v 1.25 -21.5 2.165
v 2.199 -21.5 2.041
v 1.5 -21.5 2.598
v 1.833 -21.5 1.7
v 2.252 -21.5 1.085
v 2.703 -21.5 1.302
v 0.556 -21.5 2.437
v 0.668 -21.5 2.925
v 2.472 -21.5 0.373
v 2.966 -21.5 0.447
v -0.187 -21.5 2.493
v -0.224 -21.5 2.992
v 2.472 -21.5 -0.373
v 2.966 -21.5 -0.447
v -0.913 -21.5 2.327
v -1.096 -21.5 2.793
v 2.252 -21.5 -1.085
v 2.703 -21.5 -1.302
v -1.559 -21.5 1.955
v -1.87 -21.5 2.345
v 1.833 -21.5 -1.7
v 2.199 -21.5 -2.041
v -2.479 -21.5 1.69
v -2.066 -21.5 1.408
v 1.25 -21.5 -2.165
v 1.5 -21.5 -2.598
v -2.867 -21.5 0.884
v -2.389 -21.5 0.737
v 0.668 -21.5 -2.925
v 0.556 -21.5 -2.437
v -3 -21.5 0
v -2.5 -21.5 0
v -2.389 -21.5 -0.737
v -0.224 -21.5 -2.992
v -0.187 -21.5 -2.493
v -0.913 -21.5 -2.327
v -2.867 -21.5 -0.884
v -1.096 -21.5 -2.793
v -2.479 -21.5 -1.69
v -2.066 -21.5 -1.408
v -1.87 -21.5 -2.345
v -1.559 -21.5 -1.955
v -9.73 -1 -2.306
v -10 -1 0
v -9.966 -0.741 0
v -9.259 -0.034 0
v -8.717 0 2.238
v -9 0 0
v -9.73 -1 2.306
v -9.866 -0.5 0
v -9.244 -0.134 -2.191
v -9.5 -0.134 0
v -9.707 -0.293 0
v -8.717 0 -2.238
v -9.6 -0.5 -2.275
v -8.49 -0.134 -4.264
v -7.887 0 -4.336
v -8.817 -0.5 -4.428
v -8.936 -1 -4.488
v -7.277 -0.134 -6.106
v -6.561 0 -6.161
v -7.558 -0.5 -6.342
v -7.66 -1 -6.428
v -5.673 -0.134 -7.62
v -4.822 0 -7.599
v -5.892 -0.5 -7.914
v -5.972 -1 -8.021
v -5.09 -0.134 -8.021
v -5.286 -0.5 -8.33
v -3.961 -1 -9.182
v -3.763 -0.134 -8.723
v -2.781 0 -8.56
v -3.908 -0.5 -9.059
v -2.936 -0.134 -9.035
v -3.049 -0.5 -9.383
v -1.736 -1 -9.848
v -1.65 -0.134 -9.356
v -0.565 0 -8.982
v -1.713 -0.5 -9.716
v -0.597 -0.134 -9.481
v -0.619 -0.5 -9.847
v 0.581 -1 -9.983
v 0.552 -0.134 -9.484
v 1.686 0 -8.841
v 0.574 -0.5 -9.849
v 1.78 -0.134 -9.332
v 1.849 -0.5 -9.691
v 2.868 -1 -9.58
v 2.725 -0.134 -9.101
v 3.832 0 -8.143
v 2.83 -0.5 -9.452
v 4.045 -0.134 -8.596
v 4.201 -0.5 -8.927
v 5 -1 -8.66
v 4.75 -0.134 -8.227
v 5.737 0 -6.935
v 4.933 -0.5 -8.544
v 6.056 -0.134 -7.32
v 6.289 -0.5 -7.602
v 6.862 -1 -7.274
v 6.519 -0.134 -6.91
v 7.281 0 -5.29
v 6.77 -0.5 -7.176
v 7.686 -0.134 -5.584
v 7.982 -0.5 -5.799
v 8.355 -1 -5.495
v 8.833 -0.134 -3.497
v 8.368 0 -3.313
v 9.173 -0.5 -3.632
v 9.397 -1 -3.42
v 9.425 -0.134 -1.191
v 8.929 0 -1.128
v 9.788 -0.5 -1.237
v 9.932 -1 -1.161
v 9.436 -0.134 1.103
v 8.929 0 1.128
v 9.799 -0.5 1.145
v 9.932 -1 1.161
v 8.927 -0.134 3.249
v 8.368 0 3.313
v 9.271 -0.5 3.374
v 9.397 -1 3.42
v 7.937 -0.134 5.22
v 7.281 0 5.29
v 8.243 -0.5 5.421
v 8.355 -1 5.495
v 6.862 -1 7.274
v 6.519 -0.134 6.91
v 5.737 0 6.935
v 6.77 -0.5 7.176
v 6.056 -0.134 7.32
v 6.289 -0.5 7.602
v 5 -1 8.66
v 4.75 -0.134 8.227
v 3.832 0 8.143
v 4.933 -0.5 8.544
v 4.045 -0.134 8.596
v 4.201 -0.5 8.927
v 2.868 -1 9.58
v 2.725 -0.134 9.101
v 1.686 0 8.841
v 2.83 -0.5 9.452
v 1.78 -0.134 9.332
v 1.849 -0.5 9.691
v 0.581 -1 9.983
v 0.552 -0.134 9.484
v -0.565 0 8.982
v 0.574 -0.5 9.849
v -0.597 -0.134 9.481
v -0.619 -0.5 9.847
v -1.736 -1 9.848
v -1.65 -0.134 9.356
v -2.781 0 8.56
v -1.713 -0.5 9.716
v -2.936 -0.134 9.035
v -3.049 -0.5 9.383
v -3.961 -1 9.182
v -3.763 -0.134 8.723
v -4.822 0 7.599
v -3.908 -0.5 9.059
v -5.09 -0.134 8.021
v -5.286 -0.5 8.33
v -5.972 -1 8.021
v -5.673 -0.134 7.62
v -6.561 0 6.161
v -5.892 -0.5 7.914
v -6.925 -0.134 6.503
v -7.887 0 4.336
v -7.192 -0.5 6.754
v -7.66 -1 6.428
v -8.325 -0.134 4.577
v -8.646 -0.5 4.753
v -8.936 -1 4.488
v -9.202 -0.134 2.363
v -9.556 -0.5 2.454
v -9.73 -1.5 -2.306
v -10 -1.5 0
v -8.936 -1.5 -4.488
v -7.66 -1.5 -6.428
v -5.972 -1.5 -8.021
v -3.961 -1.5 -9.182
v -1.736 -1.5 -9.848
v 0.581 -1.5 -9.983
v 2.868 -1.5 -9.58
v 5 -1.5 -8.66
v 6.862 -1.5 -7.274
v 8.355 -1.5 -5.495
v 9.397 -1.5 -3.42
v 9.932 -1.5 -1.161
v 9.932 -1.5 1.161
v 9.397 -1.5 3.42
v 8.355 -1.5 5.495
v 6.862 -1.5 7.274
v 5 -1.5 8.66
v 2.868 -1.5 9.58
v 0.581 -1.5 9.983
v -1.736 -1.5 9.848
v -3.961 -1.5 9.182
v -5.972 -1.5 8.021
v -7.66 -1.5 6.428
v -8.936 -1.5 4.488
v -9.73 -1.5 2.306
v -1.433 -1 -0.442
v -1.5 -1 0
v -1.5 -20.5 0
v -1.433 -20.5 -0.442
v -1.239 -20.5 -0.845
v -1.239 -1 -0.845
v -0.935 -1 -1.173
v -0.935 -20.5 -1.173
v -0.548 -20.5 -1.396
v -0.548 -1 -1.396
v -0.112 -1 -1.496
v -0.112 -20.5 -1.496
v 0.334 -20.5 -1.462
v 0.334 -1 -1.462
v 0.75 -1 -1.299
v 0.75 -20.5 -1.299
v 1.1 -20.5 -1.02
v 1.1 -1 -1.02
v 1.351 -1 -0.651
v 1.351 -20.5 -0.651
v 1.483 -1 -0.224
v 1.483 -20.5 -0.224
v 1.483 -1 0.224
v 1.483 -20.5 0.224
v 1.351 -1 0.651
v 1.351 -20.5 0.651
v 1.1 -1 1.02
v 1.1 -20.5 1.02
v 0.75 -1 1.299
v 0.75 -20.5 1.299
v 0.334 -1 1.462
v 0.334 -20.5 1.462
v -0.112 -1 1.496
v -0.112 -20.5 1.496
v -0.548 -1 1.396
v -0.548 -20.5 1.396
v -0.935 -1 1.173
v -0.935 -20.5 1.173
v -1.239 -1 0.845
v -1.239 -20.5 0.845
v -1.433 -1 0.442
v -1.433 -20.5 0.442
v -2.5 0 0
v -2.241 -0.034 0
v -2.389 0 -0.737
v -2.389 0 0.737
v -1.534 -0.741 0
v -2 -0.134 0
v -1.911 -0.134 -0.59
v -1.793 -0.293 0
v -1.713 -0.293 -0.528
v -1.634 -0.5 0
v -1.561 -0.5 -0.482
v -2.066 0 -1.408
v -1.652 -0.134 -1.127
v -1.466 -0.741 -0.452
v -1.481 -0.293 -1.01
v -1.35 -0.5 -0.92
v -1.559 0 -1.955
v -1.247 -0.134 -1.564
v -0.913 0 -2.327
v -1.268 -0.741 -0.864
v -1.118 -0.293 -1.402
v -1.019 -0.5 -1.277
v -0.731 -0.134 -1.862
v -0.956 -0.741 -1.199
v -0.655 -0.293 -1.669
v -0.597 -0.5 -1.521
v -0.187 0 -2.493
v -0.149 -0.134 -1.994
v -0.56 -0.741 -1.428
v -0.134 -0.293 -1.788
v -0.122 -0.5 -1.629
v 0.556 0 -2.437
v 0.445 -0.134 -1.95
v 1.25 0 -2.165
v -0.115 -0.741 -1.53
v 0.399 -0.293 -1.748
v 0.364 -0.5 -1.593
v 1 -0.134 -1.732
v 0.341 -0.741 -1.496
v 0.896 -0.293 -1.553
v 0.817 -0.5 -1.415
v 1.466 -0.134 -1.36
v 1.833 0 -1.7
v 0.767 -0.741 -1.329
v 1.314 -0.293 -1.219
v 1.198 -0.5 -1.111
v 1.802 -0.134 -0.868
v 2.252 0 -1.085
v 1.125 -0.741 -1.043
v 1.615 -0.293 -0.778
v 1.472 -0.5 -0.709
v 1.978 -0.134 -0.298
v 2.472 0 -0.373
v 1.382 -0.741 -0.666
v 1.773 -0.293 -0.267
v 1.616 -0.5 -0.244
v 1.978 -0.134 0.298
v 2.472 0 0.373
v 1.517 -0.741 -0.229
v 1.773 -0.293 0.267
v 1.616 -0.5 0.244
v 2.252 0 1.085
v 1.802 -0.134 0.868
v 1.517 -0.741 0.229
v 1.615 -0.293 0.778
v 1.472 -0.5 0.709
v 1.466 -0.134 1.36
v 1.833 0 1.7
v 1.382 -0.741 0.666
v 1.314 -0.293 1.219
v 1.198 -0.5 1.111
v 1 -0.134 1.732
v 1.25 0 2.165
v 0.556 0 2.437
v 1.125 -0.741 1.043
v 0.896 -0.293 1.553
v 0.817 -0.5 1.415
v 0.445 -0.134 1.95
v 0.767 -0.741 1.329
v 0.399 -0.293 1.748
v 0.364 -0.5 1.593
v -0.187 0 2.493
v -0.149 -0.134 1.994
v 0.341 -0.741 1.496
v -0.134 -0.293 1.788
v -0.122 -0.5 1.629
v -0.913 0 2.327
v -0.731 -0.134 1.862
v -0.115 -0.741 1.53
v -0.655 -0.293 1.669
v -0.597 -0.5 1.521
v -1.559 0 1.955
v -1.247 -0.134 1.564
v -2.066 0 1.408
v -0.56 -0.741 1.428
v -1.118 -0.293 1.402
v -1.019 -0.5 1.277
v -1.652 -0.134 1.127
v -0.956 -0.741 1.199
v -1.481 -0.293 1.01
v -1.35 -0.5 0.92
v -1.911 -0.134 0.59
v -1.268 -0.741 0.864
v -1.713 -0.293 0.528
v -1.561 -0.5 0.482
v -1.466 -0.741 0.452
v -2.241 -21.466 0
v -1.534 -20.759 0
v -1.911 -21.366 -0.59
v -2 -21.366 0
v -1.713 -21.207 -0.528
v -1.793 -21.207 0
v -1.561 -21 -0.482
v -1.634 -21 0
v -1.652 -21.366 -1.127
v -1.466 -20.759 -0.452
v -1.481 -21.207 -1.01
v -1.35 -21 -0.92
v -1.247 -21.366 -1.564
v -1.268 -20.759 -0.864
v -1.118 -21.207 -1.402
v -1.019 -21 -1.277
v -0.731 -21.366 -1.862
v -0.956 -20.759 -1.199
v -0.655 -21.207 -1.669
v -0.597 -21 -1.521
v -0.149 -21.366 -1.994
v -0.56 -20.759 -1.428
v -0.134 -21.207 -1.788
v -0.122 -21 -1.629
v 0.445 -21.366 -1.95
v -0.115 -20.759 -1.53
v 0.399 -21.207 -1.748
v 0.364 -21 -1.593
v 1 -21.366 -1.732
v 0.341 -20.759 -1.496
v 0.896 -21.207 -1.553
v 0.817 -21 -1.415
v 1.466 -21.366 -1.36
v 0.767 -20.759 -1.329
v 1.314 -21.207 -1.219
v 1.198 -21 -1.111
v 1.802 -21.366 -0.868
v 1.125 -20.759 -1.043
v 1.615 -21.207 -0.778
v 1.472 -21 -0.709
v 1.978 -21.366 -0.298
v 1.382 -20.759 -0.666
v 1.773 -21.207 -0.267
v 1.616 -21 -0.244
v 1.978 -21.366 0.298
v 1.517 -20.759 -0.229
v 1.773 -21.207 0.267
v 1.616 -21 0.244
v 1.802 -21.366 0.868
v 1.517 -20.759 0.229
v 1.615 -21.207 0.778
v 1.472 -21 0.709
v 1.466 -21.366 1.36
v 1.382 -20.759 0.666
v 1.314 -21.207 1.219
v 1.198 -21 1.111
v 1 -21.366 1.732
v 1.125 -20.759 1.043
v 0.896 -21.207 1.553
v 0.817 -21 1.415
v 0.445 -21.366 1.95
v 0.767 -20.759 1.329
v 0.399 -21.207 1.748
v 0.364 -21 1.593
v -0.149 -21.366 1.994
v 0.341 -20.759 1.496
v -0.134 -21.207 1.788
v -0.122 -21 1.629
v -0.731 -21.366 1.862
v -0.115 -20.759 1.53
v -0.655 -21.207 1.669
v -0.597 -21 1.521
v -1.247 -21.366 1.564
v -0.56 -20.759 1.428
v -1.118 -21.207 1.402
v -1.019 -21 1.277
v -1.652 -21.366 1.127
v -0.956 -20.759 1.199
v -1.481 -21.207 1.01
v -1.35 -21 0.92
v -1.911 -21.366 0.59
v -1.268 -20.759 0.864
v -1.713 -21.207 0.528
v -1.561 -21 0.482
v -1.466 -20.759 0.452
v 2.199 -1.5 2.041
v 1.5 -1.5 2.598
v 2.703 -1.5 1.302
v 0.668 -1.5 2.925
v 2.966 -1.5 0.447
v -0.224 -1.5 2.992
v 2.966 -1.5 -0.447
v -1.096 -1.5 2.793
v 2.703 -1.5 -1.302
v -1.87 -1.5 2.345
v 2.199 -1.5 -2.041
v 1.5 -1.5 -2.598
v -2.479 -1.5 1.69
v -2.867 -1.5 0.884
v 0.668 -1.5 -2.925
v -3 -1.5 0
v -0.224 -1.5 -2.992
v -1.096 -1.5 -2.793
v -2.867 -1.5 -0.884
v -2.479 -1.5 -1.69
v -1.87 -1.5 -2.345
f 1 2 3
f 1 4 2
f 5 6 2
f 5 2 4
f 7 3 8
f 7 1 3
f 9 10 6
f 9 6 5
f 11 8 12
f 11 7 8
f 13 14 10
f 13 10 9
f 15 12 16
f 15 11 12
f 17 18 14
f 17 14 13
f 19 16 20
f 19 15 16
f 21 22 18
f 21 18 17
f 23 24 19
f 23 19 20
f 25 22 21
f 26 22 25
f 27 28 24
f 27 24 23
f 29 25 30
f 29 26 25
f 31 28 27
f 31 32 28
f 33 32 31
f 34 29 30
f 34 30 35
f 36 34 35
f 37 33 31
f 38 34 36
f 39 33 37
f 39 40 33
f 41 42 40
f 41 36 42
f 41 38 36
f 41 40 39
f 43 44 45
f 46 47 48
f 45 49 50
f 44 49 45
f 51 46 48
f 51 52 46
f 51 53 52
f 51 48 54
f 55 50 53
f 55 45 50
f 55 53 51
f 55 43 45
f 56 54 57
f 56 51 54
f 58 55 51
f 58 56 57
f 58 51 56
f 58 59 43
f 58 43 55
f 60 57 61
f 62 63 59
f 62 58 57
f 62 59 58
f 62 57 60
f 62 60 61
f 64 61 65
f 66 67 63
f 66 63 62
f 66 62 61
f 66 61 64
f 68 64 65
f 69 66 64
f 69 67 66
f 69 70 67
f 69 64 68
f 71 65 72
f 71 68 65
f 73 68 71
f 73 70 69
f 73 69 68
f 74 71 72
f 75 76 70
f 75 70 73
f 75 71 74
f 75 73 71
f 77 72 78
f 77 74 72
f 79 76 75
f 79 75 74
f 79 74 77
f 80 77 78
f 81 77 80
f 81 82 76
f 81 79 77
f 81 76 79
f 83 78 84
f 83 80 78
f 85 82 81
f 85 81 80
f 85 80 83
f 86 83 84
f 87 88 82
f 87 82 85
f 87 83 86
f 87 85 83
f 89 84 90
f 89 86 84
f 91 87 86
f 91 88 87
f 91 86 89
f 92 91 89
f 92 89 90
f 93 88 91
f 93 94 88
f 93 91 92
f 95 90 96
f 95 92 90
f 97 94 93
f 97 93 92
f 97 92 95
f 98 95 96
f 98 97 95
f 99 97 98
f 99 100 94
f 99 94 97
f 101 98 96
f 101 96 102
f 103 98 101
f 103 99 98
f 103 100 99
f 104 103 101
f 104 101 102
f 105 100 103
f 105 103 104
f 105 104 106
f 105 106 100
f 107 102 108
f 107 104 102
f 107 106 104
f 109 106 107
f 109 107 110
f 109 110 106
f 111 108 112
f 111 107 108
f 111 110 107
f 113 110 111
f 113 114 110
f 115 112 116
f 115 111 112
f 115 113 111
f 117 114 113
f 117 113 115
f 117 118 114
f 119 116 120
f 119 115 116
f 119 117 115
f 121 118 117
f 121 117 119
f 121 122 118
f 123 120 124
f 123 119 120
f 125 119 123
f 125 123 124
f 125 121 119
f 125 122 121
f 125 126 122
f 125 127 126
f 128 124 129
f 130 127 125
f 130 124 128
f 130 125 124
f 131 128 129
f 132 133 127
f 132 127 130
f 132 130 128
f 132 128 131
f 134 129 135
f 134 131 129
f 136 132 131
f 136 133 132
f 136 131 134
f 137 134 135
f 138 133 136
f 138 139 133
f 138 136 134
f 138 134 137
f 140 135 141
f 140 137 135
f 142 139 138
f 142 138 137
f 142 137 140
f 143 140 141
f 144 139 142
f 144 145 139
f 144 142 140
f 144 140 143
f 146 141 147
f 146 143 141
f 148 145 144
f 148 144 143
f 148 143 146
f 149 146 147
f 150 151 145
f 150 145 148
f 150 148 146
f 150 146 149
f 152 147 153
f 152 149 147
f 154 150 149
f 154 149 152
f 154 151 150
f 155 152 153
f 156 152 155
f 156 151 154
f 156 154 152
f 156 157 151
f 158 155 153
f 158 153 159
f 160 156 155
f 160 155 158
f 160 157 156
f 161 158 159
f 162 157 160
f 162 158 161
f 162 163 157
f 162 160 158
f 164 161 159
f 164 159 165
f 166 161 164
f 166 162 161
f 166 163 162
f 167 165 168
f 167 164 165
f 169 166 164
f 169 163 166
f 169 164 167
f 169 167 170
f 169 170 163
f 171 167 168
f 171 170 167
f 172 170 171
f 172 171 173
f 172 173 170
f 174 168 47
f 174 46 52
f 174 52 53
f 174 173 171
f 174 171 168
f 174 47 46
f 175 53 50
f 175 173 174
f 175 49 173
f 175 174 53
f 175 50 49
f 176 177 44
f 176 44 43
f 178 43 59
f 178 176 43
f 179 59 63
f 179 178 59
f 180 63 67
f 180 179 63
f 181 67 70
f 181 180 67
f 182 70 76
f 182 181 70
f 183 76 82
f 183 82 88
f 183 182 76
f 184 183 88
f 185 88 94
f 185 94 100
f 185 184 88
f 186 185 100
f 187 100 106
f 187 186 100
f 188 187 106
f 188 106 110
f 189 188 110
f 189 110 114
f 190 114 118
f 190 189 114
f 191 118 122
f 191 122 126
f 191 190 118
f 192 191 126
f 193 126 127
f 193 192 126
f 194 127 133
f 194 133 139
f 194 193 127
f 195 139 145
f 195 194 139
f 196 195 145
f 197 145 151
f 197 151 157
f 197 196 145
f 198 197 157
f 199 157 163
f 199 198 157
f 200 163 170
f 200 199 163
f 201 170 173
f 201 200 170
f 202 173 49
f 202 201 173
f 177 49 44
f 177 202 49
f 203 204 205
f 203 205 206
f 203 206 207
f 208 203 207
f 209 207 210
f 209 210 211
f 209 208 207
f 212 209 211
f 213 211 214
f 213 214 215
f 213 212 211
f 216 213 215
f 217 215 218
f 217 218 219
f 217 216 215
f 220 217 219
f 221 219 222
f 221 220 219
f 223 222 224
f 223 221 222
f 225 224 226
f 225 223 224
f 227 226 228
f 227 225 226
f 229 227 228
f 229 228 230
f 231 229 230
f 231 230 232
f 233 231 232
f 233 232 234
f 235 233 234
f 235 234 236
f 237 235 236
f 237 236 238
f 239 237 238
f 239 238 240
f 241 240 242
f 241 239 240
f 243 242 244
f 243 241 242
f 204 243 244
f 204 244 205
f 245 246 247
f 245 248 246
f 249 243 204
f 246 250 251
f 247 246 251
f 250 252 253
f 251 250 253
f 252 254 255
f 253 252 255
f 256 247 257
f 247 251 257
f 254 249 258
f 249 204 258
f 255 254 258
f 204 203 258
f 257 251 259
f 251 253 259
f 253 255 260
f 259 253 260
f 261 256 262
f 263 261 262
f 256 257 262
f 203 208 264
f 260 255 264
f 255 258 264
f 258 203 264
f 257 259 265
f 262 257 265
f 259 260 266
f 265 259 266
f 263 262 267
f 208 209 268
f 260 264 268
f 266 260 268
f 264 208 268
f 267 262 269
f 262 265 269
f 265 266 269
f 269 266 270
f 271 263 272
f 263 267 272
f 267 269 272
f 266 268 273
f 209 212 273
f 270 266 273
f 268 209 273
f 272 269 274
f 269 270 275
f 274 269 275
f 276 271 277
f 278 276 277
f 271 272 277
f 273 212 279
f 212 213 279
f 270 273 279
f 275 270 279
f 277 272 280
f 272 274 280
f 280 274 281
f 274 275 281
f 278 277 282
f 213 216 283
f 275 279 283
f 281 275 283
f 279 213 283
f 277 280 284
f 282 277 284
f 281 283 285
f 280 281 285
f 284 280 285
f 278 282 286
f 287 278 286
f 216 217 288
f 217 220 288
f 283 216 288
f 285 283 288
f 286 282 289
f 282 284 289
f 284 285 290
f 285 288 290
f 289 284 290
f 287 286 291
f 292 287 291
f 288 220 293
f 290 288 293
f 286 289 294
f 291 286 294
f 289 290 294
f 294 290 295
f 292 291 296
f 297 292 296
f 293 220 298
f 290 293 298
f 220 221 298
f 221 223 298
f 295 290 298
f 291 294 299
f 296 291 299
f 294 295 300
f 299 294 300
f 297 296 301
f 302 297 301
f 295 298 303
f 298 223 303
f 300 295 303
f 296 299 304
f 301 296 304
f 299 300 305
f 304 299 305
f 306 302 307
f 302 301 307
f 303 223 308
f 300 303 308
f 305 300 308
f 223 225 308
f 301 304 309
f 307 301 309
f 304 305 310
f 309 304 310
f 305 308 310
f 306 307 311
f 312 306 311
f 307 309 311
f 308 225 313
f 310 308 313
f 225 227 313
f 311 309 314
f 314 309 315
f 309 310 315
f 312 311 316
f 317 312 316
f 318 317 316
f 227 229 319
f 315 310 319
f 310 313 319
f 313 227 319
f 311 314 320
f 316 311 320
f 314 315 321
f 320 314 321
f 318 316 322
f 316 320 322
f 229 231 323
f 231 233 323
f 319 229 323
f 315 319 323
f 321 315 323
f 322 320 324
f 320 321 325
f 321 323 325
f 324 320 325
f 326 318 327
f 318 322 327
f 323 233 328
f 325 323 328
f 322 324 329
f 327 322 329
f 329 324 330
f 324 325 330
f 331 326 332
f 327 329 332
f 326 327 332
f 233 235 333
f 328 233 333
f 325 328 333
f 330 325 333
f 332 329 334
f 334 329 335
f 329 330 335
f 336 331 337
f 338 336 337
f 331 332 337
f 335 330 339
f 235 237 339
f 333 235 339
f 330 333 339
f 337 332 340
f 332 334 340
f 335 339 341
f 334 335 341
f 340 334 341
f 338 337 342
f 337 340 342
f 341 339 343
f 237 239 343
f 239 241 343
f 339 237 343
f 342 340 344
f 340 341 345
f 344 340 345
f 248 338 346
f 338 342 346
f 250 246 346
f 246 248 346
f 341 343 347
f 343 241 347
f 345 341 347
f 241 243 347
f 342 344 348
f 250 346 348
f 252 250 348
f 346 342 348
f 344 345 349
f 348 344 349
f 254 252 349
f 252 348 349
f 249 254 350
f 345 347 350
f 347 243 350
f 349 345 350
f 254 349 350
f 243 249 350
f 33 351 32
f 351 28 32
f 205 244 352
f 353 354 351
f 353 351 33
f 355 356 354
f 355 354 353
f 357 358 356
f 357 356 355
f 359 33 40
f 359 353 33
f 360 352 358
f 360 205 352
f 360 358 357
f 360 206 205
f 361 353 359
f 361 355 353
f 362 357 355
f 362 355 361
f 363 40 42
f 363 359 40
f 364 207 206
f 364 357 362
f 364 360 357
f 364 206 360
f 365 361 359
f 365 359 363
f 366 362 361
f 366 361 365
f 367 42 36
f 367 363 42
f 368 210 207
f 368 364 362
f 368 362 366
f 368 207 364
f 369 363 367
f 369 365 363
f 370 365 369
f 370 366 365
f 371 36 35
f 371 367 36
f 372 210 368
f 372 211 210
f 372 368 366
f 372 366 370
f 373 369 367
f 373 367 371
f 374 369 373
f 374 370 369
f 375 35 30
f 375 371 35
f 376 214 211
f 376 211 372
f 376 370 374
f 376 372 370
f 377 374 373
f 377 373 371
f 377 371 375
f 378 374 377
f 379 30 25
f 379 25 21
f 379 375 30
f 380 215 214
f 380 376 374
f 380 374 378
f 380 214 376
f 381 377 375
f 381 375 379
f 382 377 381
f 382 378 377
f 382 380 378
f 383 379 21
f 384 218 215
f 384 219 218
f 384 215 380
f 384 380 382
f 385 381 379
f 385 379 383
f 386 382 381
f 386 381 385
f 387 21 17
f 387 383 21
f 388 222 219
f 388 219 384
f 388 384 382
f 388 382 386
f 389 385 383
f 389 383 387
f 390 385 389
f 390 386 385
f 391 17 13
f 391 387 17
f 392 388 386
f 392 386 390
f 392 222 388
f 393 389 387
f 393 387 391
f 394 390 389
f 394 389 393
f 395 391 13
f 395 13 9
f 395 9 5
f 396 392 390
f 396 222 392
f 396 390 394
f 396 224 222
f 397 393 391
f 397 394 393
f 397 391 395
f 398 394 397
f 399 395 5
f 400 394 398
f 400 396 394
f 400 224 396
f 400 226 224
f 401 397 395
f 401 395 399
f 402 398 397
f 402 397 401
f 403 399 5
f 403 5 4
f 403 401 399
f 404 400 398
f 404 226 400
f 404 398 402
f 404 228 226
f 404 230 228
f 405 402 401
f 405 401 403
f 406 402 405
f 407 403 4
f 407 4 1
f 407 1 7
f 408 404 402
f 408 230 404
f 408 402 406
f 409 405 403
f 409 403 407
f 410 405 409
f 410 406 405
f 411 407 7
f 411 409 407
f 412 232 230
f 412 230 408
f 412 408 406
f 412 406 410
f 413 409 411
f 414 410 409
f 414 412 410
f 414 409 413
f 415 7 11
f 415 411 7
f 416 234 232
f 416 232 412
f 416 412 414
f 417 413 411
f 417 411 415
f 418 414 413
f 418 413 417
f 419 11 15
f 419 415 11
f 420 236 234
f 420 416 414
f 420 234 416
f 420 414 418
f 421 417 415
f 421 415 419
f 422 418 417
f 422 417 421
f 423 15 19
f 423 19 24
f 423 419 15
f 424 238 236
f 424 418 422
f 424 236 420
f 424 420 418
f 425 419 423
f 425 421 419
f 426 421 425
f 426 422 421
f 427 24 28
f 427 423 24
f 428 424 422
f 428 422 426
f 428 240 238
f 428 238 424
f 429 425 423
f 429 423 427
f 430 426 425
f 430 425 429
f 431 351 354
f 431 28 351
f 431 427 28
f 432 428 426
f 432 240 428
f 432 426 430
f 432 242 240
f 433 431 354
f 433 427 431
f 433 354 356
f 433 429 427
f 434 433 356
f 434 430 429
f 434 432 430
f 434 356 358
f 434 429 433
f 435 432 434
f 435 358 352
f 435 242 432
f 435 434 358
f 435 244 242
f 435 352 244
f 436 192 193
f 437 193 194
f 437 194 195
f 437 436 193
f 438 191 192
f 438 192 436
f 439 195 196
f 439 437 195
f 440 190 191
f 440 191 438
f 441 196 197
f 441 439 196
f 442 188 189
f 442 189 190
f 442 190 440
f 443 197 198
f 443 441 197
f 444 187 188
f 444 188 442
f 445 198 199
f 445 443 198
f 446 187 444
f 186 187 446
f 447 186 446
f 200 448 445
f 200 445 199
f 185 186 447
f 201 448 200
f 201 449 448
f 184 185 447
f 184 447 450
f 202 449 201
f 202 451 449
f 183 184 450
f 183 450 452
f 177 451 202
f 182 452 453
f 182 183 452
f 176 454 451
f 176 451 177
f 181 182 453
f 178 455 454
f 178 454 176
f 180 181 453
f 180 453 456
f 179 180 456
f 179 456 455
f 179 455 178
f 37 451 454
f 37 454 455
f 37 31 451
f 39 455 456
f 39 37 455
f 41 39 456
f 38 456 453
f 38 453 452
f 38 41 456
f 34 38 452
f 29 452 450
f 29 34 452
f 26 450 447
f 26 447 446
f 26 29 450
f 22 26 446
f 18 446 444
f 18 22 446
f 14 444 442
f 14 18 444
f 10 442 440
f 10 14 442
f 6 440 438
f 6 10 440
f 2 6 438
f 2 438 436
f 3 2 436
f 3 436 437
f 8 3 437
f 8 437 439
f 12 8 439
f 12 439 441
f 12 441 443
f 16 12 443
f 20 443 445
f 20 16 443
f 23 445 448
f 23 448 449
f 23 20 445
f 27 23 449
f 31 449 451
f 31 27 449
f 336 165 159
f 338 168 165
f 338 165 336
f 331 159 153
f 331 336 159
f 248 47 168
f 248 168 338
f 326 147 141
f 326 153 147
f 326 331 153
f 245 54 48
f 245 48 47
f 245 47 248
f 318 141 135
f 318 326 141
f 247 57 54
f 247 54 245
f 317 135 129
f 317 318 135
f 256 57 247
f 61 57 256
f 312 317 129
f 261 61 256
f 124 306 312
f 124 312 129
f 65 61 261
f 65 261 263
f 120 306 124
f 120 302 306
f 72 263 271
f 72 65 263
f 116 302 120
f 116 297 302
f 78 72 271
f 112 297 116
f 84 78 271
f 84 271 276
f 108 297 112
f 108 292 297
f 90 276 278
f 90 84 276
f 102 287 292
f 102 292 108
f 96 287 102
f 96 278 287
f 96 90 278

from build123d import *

# Parameters (mm, degrees)
F2_R = 1


with BuildPart() as f1:
    # F0 (on Top) → F1 (revolve)
    with BuildSketch(Plane.XY):
        Polygon((-1.5, 0), (-10, 0), (-10, -1.5), (-3, -1.5), (-3, -21.5), (-1.5, -21.5), align=None)
    revolve(axis=Axis((0, -2.739727, 0), (0, -1, 0)))

    # F2
    f2_edges = [f1.edges().sort_by_distance(p)[0] for p in [
        (1.5, 0, 0),
        (10, 0, 0),
        (1.5, -21.5, 0),
    ]]
    fillet(f2_edges, radius=F2_R)


solid = f1.part
